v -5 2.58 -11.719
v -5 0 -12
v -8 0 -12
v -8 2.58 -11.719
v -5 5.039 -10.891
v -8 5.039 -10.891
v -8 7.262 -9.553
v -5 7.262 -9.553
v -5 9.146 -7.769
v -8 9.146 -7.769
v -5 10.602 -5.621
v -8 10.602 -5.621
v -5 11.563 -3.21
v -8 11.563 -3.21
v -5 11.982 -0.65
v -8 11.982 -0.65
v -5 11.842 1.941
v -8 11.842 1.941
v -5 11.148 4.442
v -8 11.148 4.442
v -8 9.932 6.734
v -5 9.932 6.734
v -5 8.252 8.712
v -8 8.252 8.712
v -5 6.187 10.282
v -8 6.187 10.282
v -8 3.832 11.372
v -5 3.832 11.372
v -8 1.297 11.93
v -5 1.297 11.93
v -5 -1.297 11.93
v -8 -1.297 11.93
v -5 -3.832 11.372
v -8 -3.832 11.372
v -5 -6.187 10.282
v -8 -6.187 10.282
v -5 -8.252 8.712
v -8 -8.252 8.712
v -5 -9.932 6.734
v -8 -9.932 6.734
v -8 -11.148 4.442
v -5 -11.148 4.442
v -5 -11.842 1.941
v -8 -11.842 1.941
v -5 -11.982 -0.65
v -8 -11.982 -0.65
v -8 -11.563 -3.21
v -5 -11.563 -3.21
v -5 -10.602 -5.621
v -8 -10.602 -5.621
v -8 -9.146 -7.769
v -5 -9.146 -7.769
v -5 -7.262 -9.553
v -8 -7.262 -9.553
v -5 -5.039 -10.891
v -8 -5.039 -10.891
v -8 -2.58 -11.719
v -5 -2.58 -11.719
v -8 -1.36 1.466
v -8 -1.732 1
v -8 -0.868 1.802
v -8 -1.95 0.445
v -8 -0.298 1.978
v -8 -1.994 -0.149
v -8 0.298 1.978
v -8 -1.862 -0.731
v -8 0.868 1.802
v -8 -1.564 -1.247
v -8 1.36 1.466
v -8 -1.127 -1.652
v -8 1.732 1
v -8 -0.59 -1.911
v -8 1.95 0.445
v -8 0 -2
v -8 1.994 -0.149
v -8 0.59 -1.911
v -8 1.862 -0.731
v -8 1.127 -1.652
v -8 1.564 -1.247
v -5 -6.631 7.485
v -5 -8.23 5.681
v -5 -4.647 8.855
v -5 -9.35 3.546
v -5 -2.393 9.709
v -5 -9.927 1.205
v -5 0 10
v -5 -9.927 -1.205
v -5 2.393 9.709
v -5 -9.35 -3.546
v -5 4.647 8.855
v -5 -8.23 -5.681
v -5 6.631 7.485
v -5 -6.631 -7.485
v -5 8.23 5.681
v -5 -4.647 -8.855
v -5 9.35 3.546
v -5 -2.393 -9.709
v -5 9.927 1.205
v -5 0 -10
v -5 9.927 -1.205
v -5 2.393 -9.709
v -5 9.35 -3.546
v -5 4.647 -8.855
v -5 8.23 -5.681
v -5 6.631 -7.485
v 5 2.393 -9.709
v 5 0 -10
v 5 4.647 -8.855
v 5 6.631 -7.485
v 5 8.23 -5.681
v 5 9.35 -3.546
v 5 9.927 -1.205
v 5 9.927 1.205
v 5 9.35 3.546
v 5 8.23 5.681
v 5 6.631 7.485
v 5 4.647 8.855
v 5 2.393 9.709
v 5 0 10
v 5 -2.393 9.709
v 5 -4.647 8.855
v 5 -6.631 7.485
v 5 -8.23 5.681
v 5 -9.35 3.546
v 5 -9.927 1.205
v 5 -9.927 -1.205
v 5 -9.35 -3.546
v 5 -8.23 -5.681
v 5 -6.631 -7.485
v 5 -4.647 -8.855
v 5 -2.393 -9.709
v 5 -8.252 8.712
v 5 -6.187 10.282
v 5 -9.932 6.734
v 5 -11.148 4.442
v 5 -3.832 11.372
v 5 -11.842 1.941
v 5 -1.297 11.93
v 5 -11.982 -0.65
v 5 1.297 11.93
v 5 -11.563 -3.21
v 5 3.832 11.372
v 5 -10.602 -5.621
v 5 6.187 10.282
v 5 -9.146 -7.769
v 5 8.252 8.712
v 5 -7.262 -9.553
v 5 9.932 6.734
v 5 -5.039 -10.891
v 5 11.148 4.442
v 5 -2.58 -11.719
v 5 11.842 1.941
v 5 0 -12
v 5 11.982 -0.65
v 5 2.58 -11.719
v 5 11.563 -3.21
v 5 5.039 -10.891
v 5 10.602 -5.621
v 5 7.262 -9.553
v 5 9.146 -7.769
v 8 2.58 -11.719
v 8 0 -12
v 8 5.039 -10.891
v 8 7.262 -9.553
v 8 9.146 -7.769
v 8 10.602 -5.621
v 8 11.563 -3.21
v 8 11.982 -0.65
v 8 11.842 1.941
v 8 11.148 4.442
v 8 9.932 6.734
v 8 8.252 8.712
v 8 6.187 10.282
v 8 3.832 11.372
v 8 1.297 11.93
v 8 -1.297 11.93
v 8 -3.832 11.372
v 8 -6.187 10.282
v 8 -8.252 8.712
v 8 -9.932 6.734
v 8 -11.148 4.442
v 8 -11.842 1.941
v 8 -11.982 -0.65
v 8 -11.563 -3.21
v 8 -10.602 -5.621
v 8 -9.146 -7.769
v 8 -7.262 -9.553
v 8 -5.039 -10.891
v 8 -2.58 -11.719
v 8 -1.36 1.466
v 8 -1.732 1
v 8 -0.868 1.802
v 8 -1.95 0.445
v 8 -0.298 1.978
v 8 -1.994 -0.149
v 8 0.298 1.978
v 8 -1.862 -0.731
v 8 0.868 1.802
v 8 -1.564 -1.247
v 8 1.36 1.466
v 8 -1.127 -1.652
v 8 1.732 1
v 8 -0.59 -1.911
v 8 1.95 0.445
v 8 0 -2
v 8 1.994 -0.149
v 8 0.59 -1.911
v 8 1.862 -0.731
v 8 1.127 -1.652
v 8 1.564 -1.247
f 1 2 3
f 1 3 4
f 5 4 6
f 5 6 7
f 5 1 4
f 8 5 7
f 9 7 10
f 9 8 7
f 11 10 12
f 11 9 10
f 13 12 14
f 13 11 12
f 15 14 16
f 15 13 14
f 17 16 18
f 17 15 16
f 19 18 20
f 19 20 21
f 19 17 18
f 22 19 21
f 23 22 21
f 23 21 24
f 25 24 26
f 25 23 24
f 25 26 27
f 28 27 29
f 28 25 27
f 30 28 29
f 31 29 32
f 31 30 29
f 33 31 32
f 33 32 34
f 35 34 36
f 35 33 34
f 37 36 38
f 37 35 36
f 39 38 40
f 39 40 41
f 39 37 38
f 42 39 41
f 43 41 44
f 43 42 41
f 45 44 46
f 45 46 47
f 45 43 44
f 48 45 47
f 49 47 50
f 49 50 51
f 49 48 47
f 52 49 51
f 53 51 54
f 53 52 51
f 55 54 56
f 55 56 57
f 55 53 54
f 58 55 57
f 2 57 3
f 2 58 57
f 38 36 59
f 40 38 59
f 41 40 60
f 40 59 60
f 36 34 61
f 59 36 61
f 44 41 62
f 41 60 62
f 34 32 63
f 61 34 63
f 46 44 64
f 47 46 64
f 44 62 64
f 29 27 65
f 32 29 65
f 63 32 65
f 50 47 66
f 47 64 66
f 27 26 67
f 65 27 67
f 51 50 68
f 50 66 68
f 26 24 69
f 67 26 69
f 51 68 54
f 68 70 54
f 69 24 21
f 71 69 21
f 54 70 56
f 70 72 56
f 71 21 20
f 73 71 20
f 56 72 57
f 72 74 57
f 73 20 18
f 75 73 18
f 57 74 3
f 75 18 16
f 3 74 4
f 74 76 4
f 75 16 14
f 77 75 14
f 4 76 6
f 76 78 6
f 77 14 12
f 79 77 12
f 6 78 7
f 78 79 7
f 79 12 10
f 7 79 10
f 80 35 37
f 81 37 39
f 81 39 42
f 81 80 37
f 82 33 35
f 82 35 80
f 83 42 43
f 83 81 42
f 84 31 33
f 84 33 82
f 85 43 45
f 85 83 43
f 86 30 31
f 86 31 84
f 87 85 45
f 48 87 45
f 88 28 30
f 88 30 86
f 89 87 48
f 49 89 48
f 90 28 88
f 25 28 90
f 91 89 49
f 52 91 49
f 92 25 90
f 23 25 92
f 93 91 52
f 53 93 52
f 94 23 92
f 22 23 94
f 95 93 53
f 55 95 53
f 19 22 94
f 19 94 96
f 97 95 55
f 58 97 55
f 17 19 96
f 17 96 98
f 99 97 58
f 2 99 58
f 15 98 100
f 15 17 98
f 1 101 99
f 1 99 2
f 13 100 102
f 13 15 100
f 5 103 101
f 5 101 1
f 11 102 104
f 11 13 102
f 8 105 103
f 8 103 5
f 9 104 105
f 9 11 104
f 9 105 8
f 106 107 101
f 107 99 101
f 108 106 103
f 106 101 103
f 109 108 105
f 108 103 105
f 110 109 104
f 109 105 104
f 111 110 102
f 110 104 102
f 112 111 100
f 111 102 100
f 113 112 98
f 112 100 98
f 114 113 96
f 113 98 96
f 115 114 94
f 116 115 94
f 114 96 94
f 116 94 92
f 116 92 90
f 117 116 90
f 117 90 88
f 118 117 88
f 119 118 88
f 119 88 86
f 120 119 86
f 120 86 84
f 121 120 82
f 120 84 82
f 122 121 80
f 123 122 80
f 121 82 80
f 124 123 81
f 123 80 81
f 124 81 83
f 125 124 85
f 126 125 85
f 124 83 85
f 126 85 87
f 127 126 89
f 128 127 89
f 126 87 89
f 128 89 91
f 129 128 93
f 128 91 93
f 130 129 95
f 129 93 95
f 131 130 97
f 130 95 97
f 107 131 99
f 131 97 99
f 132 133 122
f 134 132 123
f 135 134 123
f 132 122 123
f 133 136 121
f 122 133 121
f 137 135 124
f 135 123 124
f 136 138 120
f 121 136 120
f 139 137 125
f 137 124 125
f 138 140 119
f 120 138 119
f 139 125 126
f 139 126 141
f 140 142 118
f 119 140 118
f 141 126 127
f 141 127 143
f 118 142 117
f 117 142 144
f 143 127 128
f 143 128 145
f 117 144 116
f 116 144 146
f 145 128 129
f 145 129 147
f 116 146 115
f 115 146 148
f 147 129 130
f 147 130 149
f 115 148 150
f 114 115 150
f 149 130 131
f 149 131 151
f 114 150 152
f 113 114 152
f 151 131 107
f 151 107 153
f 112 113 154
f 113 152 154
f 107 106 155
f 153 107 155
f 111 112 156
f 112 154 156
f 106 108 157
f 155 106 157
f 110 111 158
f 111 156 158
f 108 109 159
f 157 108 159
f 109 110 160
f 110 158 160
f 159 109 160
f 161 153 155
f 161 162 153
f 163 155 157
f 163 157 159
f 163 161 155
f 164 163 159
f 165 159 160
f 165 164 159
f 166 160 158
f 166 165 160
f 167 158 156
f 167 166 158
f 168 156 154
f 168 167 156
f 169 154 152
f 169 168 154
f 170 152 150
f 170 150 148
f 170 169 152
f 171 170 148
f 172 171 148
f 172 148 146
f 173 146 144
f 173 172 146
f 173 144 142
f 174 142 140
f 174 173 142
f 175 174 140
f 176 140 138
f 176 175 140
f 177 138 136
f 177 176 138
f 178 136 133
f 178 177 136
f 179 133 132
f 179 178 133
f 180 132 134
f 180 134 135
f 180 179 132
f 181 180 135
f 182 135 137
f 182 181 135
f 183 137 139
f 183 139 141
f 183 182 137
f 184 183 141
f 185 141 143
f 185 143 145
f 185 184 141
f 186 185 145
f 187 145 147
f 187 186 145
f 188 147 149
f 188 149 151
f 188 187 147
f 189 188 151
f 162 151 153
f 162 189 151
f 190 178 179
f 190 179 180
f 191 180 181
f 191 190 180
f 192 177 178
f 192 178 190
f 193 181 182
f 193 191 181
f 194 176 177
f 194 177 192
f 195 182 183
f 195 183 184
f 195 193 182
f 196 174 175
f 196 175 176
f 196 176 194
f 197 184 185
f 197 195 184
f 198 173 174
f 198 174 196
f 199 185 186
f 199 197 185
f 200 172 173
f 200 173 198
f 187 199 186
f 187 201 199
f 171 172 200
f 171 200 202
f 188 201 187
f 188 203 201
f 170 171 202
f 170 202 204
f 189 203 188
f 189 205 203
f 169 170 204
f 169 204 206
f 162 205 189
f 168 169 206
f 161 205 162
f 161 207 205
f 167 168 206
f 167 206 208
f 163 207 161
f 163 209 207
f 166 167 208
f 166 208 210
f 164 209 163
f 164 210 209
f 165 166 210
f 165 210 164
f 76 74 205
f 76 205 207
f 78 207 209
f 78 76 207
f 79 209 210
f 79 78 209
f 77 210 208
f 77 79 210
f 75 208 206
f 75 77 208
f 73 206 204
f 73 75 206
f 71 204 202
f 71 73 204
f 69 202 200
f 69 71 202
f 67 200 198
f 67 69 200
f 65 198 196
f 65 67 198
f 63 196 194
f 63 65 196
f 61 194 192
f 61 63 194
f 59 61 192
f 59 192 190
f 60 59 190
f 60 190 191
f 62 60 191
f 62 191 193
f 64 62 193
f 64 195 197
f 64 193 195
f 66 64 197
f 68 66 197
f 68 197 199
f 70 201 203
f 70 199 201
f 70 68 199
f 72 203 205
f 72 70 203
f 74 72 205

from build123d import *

# Parameters (mm, degrees)
SKETCH_2_R               = 12
EXTRUDE_1_DEPTH          = 8
SKETCH_3_R               = 12
SKETCH_3_R_2             = 10
CUT_EXTRUDE_1_DEPTH      = 5
CUT_EXTRUDE_2_DEPTH      = 19.761663039
CUT_EXTRUDE_2_DEPTH_BACK = 19.761663039
SKETCH_4_R               = 2


with BuildPart() as part:
    # 草图2 → 凸台-拉伸1 (new, symmetric)
    with BuildSketch(Plane(origin=(0, 0, 0), x_dir=(0, 0, -1), z_dir=(1, 0, 0))):
        Circle(SKETCH_2_R)
    extrude(amount=EXTRUDE_1_DEPTH, both=True)

    # 草图3 → 切除-拉伸1 (cut, symmetric)
    with BuildSketch(Plane(origin=(0, 0, 0), x_dir=(0, 0, -1), z_dir=(1, 0, 0))):
        Circle(SKETCH_3_R)
        Circle(SKETCH_3_R_2, mode=Mode.SUBTRACT)
    extrude(amount=CUT_EXTRUDE_1_DEPTH, both=True, mode=Mode.SUBTRACT)

    # 草图4 → 切除-拉伸2 (cut, two sides: drawn at the far end of the back side and taken through both)
    with BuildSketch(Plane(origin=(0, 0, 0), x_dir=(0, 0, -1), z_dir=(1, 0, 0)).offset(-CUT_EXTRUDE_2_DEPTH_BACK)):
        Circle(SKETCH_4_R)
    extrude(amount=CUT_EXTRUDE_2_DEPTH + CUT_EXTRUDE_2_DEPTH_BACK, mode=Mode.SUBTRACT)


solid = part.part
